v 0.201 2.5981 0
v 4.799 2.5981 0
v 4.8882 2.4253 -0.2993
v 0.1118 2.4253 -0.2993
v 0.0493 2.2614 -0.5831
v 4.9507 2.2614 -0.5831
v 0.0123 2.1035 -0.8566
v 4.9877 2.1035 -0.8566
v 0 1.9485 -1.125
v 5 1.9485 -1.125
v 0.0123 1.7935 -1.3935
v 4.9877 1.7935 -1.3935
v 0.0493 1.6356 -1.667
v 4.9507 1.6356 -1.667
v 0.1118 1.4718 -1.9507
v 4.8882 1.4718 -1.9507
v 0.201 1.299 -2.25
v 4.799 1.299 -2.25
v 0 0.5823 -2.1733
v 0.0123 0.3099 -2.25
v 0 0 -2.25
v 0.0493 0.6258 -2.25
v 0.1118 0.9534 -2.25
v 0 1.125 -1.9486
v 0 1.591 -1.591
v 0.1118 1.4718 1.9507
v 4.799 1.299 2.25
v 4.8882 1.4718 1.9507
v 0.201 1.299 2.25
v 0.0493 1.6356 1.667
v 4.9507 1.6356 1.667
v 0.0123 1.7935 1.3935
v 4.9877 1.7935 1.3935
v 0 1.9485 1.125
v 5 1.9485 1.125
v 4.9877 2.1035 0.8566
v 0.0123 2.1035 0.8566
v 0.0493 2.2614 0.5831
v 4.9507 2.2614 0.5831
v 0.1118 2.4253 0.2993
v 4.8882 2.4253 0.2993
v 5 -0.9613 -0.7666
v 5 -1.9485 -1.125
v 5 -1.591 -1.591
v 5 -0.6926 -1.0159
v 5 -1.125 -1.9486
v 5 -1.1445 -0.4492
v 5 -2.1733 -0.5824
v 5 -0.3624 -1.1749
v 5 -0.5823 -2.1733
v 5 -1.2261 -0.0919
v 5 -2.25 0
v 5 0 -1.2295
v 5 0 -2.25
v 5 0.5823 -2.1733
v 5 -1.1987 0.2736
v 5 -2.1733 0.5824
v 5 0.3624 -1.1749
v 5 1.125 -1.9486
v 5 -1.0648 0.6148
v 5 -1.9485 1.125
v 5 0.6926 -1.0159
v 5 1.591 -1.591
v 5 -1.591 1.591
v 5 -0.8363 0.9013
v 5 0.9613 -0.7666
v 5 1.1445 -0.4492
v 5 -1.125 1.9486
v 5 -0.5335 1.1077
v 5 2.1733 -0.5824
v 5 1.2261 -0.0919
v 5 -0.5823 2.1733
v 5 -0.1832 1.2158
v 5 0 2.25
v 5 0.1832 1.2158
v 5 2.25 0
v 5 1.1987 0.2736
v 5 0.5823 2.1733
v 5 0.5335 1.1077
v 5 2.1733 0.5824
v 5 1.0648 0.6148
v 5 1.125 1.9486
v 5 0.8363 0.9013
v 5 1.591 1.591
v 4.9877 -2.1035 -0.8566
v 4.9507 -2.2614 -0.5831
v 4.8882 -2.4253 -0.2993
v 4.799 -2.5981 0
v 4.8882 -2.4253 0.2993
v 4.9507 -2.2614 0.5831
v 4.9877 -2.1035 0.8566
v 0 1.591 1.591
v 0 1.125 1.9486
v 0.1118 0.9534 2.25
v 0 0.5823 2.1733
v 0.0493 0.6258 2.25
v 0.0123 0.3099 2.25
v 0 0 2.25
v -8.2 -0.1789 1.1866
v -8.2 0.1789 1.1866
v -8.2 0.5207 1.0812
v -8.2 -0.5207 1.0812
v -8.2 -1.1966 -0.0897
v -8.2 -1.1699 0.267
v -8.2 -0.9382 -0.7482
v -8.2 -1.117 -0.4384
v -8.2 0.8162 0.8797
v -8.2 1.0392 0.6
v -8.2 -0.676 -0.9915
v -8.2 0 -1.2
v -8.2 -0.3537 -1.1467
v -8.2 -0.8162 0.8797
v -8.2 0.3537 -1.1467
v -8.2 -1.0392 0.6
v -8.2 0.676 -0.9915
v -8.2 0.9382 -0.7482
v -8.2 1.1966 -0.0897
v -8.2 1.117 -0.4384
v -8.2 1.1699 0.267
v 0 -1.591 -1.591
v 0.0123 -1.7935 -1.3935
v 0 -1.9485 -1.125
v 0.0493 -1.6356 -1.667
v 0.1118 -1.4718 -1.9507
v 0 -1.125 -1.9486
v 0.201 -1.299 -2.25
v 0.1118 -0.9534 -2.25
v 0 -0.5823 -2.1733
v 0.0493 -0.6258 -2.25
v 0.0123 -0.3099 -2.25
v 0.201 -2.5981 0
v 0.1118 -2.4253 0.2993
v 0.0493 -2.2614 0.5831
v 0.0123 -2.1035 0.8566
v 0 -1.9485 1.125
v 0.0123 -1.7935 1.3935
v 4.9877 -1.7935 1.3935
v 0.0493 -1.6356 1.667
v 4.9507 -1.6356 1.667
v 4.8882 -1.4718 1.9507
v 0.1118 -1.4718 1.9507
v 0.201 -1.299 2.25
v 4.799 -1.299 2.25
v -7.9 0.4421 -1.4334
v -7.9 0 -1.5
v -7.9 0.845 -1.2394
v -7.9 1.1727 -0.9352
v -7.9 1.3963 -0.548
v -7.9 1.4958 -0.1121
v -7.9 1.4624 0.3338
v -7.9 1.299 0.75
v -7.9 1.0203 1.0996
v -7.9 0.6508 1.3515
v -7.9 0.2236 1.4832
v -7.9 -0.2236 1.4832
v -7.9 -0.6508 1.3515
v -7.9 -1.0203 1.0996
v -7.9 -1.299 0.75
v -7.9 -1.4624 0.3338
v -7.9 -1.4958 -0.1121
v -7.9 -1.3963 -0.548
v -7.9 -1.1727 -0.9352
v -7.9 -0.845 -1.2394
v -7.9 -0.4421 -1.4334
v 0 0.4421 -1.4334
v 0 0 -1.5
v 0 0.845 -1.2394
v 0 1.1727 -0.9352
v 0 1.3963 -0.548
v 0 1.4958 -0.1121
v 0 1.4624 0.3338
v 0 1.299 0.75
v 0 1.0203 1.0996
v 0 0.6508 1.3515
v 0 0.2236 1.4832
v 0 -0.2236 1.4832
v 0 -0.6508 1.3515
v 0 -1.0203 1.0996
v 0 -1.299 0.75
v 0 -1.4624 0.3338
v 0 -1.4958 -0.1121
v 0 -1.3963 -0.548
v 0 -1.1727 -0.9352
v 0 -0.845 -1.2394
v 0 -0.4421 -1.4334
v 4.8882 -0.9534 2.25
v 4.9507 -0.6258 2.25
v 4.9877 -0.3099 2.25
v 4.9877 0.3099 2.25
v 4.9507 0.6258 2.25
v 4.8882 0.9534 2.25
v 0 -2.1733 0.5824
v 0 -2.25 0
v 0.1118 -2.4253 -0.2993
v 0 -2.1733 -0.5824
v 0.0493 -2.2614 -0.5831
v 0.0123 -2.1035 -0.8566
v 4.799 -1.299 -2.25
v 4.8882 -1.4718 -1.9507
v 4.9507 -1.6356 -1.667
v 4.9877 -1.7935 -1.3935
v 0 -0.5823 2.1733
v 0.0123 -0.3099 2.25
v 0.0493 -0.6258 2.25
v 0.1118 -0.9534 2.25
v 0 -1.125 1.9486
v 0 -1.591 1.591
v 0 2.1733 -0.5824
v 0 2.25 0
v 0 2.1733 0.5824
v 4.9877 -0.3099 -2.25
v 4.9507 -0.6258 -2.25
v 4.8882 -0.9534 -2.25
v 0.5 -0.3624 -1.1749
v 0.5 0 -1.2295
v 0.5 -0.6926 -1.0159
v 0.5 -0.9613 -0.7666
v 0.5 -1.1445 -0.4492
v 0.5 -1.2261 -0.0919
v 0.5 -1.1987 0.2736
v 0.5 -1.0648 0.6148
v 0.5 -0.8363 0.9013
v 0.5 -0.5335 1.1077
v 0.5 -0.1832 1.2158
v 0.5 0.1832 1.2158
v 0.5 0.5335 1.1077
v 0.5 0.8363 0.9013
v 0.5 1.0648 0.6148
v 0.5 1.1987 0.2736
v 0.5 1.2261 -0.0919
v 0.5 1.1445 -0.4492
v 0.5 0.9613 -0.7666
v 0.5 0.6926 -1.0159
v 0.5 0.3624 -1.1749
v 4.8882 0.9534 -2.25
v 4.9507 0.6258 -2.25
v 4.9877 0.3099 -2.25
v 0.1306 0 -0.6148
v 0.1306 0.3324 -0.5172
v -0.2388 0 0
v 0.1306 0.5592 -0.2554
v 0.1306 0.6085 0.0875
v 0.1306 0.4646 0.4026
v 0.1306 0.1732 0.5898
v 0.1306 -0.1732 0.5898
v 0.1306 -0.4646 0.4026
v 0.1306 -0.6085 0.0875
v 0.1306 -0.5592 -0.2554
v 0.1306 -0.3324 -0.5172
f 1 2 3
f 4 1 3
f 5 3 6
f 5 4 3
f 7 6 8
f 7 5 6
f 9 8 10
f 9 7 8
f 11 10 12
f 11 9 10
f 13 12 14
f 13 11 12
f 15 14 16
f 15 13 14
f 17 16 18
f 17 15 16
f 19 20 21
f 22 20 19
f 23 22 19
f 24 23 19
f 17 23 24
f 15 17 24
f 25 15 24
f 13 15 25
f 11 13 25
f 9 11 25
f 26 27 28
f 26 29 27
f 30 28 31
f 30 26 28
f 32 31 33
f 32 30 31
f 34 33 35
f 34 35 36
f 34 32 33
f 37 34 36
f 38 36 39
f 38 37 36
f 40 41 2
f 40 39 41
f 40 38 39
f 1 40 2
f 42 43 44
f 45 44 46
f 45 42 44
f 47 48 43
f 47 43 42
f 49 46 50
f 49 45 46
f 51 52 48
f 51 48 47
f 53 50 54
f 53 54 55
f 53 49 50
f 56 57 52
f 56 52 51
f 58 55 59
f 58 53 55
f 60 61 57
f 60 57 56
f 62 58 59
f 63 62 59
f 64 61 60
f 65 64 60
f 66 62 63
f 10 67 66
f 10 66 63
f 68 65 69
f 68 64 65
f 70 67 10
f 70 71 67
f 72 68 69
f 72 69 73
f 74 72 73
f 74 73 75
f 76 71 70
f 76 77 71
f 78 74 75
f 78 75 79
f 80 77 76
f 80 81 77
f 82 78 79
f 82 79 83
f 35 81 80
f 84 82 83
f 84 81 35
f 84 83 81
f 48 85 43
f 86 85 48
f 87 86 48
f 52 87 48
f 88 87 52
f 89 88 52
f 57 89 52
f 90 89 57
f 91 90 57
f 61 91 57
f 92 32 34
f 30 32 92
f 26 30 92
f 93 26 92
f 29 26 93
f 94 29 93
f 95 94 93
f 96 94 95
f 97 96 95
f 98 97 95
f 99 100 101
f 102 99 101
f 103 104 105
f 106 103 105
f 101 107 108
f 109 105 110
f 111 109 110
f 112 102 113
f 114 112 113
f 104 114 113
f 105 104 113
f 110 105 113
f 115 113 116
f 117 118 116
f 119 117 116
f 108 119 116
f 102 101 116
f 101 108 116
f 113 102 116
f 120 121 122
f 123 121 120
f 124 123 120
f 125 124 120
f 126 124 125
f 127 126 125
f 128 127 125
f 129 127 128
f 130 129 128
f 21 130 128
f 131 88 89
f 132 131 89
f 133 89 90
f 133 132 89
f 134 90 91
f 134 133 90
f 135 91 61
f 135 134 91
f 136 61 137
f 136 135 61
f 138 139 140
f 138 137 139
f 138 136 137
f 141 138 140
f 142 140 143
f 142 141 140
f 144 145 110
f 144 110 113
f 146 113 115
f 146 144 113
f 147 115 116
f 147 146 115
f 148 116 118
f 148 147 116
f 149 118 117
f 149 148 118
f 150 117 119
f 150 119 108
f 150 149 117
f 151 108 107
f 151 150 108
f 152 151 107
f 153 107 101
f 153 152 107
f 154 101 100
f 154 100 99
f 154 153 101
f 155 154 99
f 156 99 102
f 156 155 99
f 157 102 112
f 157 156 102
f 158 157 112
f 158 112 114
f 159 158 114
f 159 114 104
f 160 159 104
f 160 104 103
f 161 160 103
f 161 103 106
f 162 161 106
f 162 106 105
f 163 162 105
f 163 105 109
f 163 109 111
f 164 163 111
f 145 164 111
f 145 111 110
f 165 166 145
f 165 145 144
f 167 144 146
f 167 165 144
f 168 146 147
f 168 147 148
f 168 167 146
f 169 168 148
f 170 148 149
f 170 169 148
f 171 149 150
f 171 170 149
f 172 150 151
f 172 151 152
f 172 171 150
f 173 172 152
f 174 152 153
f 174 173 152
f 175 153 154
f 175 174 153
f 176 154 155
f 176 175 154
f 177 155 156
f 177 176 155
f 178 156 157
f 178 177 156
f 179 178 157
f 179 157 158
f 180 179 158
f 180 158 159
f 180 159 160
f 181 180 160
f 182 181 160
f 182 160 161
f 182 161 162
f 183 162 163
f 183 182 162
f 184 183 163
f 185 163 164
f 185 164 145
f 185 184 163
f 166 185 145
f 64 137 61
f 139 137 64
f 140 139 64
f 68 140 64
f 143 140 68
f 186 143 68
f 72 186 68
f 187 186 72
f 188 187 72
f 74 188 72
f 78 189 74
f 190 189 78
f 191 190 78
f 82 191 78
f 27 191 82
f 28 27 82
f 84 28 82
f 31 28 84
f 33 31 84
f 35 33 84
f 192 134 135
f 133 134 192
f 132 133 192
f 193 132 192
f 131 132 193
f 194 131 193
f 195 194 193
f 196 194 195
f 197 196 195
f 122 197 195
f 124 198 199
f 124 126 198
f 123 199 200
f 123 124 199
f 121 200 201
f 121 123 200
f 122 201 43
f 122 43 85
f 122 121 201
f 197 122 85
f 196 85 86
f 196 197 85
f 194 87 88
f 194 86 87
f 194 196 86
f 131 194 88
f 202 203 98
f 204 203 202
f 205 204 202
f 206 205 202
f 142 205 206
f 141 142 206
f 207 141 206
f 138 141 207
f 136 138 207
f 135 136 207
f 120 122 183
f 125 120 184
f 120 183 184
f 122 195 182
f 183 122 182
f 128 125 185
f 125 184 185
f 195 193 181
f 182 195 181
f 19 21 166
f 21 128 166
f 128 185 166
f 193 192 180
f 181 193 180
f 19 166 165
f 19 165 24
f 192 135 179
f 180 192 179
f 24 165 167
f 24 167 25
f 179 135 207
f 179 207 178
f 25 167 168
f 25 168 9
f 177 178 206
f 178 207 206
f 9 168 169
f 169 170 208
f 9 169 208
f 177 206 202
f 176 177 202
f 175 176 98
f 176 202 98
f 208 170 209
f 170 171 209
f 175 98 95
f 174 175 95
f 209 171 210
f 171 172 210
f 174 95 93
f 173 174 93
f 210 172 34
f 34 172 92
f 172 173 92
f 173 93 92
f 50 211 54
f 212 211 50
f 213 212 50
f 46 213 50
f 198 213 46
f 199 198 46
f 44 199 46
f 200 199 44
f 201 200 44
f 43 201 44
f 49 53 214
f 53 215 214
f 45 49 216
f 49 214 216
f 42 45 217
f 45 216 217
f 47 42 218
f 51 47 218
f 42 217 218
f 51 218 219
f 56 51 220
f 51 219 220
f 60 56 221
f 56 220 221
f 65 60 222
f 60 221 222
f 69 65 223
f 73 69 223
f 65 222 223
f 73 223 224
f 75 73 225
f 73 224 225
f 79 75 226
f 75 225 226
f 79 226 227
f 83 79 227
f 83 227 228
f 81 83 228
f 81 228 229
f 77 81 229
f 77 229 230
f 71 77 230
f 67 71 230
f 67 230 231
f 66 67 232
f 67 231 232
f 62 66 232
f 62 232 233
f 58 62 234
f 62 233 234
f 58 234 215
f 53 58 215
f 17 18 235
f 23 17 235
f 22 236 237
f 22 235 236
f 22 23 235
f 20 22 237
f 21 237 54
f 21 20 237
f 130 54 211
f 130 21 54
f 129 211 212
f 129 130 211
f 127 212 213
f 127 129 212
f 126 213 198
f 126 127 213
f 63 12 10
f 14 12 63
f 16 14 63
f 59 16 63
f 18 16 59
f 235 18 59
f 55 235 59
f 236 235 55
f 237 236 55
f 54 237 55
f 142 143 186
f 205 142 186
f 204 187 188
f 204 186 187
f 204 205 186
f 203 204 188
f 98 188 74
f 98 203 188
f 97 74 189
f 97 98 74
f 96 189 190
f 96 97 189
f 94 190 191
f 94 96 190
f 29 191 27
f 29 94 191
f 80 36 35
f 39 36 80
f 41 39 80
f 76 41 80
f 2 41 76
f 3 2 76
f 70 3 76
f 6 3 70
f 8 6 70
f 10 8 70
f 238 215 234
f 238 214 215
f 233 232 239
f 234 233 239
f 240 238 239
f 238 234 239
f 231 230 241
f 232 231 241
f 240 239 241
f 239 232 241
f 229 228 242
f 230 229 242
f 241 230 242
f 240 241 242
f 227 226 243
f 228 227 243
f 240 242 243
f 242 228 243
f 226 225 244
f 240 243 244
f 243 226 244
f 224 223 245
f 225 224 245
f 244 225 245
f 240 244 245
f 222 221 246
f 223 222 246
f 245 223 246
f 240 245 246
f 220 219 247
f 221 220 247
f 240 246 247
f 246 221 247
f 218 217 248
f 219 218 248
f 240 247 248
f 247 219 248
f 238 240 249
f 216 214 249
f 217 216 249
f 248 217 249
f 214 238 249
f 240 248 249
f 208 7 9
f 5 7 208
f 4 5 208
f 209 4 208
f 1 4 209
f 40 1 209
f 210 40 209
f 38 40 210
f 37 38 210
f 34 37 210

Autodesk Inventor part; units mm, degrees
ref_plane "YZ Plane" through (0, 0, 0) normal (1, 0, 0) x (0, 1, 0)
ref_plane "XZ Plane" through (0, 0, 0) normal (0, 1, 0) x (-1, 0, 0)
ref_plane "XY Plane" through (0, 0, 0) normal (0, 0, 1) x (1, 0, 0)
sketch "Sketch1" plane through (0, 0, 0) normal (1, 0, 0) x (0, 1, 0)
  line L0 (2.5981, 0) -> (1.299, -2.25)
  line L1 (1.299, -2.25) -> (-1.299, -2.25)
  line L2 (-1.299, -2.25) -> (-2.5981, 0)
  line L3 (-2.5981, 0) -> (-1.299, 2.25)
  line L4 (-1.299, 2.25) -> (1.299, 2.25)
  line L5 (1.299, 2.25) -> (2.5981, 0)
  point P0 (0, 0)
  point P1 (0, 0)
  dimension "d0" = 4.5
extrude "Extrusion1" add sketch "Sketch1" along normal blind 5
sketch "Sketch2" plane through (5, 0, 0) normal (1, 0, 0) x (0, 0, -1)
  circle A0 centre (0, 0) radius 1.5
  dimension "d3" = 3
extrude "Extrusion2" add sketch "Sketch2" against normal blind 13.2
sketch "Sketch3" plane through (5, 0, 0) normal (1, 0, 0) x (0, 0, -1)
  point P0 (0, 0)
  point P1 (0, 0)
hole "Hole1" at (5, 0, 0) direction (-1, 0, 0) diameter 2.459 depth 4.5 tip angle 118 thread size "M3x0.5" designation "M3" class "6H" standard "ISO Metric profile"
thread "Thread1" size "M3x0.5" designation "M3" class "6g" standard "ISO Metric profile" length 7.3
chamfer "Chamfer1" distance 0.3 angle 45 1 edges at (-8.2, 0, 1.5)
sketch "Sketch4" plane through (0, 0, 0) normal (0, 1, 0) x (-1, 0, 0)
  line L0 (0, 2.25) -> (-1.7321, 5.25)
  line L1 (-1.7321, 5.25) -> (0, 5.25)
  line L2 (0, 5.25) -> (0, 2.25)
  line L3 (-3.2679, 5.25) -> (-5, 2.25)
  line L4 (-5, 2.25) -> (-5, 5.25)
  line L5 (-5, 5.25) -> (-3.2679, 5.25)
  line L6 (10.84, 0) -> (-7.64, 0) projected
  point P0 (0, 0)
  dimension "d19" = 30
  dimension "d20" = 3
revolve "Revolution1" cut sketch "Sketch4" angle 360 about axis through (-10, 0, 0) along (1, 0, 0)
properties part number "Befestigungsbolzen_M3x13-2_Provertha-531333T" material "Steel"
